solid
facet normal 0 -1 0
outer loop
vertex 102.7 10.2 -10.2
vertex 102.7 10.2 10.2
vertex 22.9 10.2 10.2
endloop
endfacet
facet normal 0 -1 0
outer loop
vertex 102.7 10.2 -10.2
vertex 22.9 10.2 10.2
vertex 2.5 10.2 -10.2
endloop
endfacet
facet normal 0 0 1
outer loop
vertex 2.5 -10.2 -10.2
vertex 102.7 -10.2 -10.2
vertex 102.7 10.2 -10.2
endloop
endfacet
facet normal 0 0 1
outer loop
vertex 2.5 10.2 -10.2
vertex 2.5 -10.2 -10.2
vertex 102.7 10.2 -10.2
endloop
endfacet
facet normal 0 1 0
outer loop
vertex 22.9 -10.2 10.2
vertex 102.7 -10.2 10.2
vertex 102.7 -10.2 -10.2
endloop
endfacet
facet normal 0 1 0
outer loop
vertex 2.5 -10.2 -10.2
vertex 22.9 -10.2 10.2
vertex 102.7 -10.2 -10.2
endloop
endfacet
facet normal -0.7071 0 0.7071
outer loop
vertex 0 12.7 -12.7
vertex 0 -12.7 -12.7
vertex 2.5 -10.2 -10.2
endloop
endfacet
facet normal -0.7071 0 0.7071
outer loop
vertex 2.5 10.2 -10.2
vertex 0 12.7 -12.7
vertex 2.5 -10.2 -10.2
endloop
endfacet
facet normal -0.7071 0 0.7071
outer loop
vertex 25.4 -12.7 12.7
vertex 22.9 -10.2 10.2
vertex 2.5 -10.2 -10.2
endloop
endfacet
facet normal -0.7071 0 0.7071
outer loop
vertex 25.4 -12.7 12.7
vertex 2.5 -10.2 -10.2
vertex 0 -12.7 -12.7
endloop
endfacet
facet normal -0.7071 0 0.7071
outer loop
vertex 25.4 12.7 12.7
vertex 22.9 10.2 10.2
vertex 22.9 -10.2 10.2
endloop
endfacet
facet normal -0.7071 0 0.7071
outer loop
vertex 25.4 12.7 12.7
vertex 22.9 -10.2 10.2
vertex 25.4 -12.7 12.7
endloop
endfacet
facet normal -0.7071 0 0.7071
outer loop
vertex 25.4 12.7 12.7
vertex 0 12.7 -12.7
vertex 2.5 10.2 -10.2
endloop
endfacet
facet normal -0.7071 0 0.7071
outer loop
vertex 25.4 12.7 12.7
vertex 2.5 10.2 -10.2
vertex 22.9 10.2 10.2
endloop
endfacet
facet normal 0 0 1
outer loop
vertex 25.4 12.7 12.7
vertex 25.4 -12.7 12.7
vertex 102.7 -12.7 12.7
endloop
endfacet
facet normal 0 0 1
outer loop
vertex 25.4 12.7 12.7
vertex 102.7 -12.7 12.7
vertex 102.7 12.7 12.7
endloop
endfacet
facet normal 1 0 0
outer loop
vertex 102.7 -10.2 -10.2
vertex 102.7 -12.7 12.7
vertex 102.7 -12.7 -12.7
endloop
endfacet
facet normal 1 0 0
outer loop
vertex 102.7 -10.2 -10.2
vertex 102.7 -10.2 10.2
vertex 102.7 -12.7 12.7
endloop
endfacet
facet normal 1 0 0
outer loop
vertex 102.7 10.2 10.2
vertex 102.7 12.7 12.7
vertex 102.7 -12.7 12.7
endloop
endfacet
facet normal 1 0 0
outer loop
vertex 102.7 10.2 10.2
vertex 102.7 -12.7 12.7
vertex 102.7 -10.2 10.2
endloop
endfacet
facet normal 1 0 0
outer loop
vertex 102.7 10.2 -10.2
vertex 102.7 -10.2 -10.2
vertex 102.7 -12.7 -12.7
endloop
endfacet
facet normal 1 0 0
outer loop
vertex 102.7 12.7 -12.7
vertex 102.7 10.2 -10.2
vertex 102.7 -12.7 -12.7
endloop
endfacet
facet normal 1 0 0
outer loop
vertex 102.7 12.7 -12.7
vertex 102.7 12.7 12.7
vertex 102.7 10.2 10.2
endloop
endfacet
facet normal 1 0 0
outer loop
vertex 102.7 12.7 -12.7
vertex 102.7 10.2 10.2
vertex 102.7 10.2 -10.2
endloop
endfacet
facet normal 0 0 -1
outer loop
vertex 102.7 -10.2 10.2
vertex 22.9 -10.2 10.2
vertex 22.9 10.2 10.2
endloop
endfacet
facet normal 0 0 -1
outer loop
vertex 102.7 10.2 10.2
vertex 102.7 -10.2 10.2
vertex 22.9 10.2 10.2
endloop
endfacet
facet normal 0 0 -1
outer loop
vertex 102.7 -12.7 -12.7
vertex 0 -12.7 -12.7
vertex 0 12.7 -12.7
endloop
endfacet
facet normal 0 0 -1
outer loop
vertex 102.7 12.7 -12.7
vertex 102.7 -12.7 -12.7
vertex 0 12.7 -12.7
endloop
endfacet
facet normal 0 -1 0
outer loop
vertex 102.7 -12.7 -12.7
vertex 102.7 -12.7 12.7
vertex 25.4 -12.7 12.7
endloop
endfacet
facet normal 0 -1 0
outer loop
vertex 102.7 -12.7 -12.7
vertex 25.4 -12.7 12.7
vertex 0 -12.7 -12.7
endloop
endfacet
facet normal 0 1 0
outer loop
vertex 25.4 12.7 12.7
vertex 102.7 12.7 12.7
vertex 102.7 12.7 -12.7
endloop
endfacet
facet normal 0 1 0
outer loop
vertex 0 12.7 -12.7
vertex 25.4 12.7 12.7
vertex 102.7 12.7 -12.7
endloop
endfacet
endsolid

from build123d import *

# Parameters (mm, degrees)
SKETCH2_W           = 25.4
SKETCH2_H           = 25.4
SKETCH2_W_2         = 20.4
SKETCH2_H_2         = 20.4
BOSS_EXTRUDE1_DEPTH = 102.7
CUT_EXTRUDE1_DEPTH  = 107.553930007


with BuildPart() as part:
    # Sketch2 → Boss-Extrude1 (new body)
    with BuildSketch(Plane(origin=(0, 0, 0), x_dir=(0, 0, -1), z_dir=(1, 0, 0))):
        Rectangle(SKETCH2_W, SKETCH2_H)
        Rectangle(SKETCH2_W_2, SKETCH2_H_2, mode=Mode.SUBTRACT)
    extrude(amount=BOSS_EXTRUDE1_DEPTH)

    # Sketch3 → Cut-Extrude1 (cut, through all)
    with BuildSketch(Plane(origin=(0, 12.7, 0), x_dir=(1, 0, 0), z_dir=(0, 1, 0))):
        Polygon((0, -12.7), (0, 12.7), (25.4, -12.7), align=None)
    extrude(amount=-CUT_EXTRUDE1_DEPTH, mode=Mode.SUBTRACT)


solid = part.part
